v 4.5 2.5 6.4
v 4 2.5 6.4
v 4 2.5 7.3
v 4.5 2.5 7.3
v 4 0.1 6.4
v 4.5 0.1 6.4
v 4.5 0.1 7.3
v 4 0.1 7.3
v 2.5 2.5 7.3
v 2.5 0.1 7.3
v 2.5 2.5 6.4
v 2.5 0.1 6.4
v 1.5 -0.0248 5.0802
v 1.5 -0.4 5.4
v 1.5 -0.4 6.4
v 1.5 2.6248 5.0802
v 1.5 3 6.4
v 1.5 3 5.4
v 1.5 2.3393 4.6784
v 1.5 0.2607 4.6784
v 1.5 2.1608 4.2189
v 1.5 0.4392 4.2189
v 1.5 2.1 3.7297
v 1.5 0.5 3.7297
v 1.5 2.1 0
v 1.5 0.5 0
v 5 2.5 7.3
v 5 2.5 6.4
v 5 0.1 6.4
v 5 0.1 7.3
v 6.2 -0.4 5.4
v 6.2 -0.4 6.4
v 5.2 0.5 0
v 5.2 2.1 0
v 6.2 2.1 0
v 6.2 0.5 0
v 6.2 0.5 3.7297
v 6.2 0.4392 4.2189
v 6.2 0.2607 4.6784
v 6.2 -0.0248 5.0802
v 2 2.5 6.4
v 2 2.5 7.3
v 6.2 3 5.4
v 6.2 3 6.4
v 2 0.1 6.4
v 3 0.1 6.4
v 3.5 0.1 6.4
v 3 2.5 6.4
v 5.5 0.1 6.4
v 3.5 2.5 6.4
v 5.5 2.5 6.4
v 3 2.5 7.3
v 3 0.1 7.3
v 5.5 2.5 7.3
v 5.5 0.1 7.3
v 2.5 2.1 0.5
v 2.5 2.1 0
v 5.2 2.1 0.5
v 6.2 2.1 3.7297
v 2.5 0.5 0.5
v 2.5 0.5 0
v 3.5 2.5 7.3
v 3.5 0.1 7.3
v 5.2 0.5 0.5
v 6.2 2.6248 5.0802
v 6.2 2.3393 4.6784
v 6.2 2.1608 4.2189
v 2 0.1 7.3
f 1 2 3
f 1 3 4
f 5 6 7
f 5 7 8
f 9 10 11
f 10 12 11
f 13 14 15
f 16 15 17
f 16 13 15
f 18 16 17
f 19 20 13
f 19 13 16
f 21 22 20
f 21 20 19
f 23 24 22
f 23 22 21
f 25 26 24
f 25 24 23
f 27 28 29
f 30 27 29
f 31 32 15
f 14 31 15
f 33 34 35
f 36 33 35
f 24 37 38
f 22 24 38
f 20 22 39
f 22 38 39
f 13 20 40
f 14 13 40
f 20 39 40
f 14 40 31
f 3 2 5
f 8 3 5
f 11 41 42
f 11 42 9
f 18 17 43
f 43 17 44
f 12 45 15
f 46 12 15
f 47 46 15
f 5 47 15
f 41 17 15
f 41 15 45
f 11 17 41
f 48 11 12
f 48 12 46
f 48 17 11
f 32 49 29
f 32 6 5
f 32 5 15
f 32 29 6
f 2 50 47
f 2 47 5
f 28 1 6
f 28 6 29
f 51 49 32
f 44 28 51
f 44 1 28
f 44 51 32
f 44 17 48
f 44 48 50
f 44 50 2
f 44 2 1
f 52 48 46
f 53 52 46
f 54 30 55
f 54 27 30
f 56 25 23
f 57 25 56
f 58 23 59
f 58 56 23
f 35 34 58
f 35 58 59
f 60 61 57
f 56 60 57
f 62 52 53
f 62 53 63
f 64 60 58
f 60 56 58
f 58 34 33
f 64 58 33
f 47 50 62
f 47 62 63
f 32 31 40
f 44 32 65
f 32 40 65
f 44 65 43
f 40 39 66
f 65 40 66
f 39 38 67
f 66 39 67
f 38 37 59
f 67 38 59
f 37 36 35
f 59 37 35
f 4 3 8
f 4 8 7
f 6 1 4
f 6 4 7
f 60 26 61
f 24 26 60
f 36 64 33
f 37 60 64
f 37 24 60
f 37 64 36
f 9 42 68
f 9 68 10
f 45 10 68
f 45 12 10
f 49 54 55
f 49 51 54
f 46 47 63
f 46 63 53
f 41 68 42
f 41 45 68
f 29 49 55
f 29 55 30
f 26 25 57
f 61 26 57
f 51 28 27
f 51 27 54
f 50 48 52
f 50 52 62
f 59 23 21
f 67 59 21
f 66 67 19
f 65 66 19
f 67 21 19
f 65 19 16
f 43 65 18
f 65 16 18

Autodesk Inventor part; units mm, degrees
ref_plane "YZ Plane" through (0, 0, 0) normal (1, 0, 0) x (0, 1, 0)
ref_plane "XZ Plane" through (0, 0, 0) normal (0, 1, 0) x (-1, 0, 0)
sketch "Szkic1" plane through (0, 0, 0) normal (0, 0, 1) x (1, 0, 0)
  line L0 (2.7, 2.2) -> (2.7, 0.4) projected
  line L1 (5, 0.4) -> (5, 2.2) projected
  line L2 (5, 2.2) -> (5, 2.6) projected
  line L3 (2.7, 2.6) -> (2.7, 2.2) projected
  line L4 (2.7, 0.4) -> (2.7, 0) projected
  line L5 (5, 0) -> (5, 0.4) projected
  line L6 (2.7, 0) -> (5, 0) projected
  line L7 (5, 2.6) -> (2.7, 2.6) projected
  line L8 (2.5, -0.2) -> (2.5, 0.4)
  line L9 (2.5, 0.4) -> (2.5, 2.2)
  line L10 (2.5, 2.2) -> (2.5, 2.8)
  line L11 (2.5, 2.8) -> (5.2, 2.8)
  line L12 (5.2, 2.8) -> (5.2, 2.2)
  line L13 (5.2, 2.2) -> (5.2, 0.4)
  line L14 (5.2, 0.4) -> (5.2, -0.2)
  line L15 (5.2, -0.2) -> (2.5, -0.2)
  line L16 (2.7, 0) -> (2.7, 2.6) projected
  line L17 (0, 2.6) -> (2.7, 2.6) projected
  line L18 (0, 0) -> (0, 2.6) projected
  line L19 (0, 0) -> (2.7, 0) projected
  line L20 (5, 2.6) -> (5, 0) projected
  line L21 (5, 0) -> (10, 0) projected
  line L22 (10, 0) -> (10, 2.6) projected
  line L23 (5, 2.6) -> (10, 2.6) projected
  line L24 (2.5, 0) -> (1.5, 0)
  line L25 (1.5, 0) -> (1.5, 2.6)
  line L26 (1.5, 2.6) -> (2.5, 2.6)
  line L27 (2.5, 2.6) -> (2.5, 0)
  line L28 (5.2, 0) -> (6.2, 0)
  line L29 (6.2, 0) -> (6.2, 2.6)
  line L30 (6.2, 2.6) -> (5.2, 2.6)
  line L31 (5.2, 2.6) -> (5.2, 0)
  dimension "d0" = 0.2
  dimension "d1" = 1
  dimension "d2" = 1
extrude "Wyciągnięcie proste1" add sketch "Szkic1" along normal blind 0.5 contours L10 L9 L8 L19 L25 L17 | L23 L29 L21 L14 L13 L12
sketch "Szkic2" plane through (0, 0, 0.5) normal (0, 0, 1) x (1, 0, 0)
  line L0 (1.5, 0) -> (2.5, 0) projected
  line L1 (2.5, 0) -> (2.5, 2.6) projected
  line L2 (2.5, 2.6) -> (1.5, 2.6) projected
  line L3 (1.5, 2.6) -> (1.5, 0) projected
  line L4 (6.2, 2.6) -> (5.2, 2.6) projected
  line L5 (5.2, 2.6) -> (5.2, 0) projected
  line L6 (5.2, 0) -> (6.2, 0) projected
  line L7 (6.2, 0) -> (6.2, 2.6) projected
  line L8 (1.5, 2.6) -> (6.2, 2.6)
  line L9 (6.2, 2.6) -> (6.2, 0)
  line L10 (6.2, 0) -> (1.5, 0)
  line L11 (1.5, 0) -> (1.5, 2.6)
  point P0 (0, 0)
ref_plane "Płaszczyzna konstrukcyjna1" through (-1, -0.5, 6.4) normal (0, 0, -1) x (0, 1, 0)
extrude "Wyciągnięcie proste2" add sketch "Szkic2" along normal up to surface (5.9 mm away)
sketch "Szkic3" plane through (1.5, 0, 6.4) normal (0, 0, 1) x (1, 0, 0)
  line L0 (9.5, 3.1) -> (-2.5, 3.1) projected
  line L1 (-2.5, 3.1) -> (-2.5, -0.5) projected
  line L2 (-2.5, -0.5) -> (9.5, -0.5) projected
  line L3 (9.5, -0.5) -> (9.5, 3.1) projected
  line L4 (0, 2.6) -> (0, 0) projected
  line L5 (0, 0) -> (4.7, 0) projected
  line L6 (4.7, 0) -> (4.7, 2.6) projected
  line L7 (4.7, 2.6) -> (0, 2.6) projected
  line L8 (0, 3.1) -> (4.7, 3.1)
  line L9 (4.7, 3.1) -> (4.7, -0.5)
  line L10 (4.7, -0.5) -> (0, -0.5)
  line L11 (0, -0.5) -> (0, 3.1)
  line L12 (-2.4, 3) -> (9.4, 3)
  line L13 (9.4, 3) -> (9.4, -0.4)
  line L14 (9.4, -0.4) -> (-2.4, -0.4)
  line L15 (-2.4, -0.4) -> (-2.4, 3)
  point P0 (-1.5, 0)
  point P1 (4.7, 3)
  point P2 (0, 3)
  point P3 (0, -0.4)
  point P4 (4.7, -0.4)
  dimension "d7" = 0.1
extrude "Wyciągnięcie proste3" add sketch "Szkic3" against normal blind 1 contours L9 L7 L11 L12 | L6 L5 L4 L7 | L14 L11 L5 L9
sketch "Szkic4" plane through (1.5, -0.4, 6.4) normal (0, 0, 1) x (1, 0, 0)
  line L0 (-2.2, 3.2) -> (9.2, 3.2) projected
  line L1 (9.2, 0.2) -> (-2.2, 0.2) projected
  line L2 (-2.2, 0.2) -> (-2.2, 3.2) projected
  line L3 (9.2, 3.2) -> (9.2, 0.2) projected
  line L4 (0, 3.4) -> (0, 0) projected
  line L5 (0, 0) -> (4.7, 0) projected
  line L6 (4.7, 0) -> (4.7, 3.4) projected
  line L7 (4.7, 3.4) -> (0, 3.4) projected
  line L8 (0.5, 0.5) -> (0.5, 2.9)
  line L9 (0.5, 2.9) -> (4.2, 2.9)
  line L10 (4.2, 2.9) -> (4.2, 0.5)
  line L11 (4.2, 0.5) -> (0.5, 0.5)
  line L12 (1, 0.4) -> (1, 3) projected
  line L13 (0.5, 2.9) -> (1, 2.9)
  line L14 (1, 2.9) -> (1, 0.5)
  line L15 (1, 0.5) -> (0.5, 0.5)
  line L16 (0.5, 0.5) -> (0.5, 2.9)
  line L17 (1.5, 2.9) -> (1.5, 0.5)
  line L18 (2, 2.9) -> (2, 0.5)
  line L19 (2.5, 2.9) -> (2.5, 0.5)
  line L20 (3, 2.9) -> (3, 0.5)
  line L21 (3.5, 2.9) -> (3.5, 0.5)
  line L22 (4, 2.9) -> (4, 0.5)
  point P0 (-1.5, 0.4)
  point P1 (4, 0.5)
  point P2 (4, 2.9)
  point P3 (3.5, 2.9)
  point P4 (3.5, 0.5)
  point P5 (3, 0.5)
  point P6 (3, 2.9)
  point P7 (2.5, 0.5)
  point P8 (2, 0.5)
  point P9 (1.5, 2.9)
  point P10 (1.5, 0.5)
  point P11 (1, 2.9)
  dimension "d10" = 0.5
  dimension "d13" = 0.5
extrude "Wyciągnięcie proste4" add sketch "Szkic4" along normal blind 0.9 contours L8 L9 L12 L11 | L17 L9 L18 L11 | L19 L9 L20 L11 | L21 L9 L22 L11
sketch "Szkic5" plane through (1.5, 0, 0) normal (0, -1, 0) x (1, 0, 0)
  line L0 (4.7, 5.4) -> (0, 5.4) projected
  line L1 (0, 0) -> (0, 5.4) projected
  line L2 (0, 0) -> (1, 0) projected
  line L3 (1, 0) -> (1, 0.5) projected
  line L4 (1, 0.5) -> (3.7, 0.5) projected
  line L5 (3.7, 0) -> (3.7, 0.5) projected
  line L6 (3.7, 0) -> (4.7, 0) projected
  line L7 (4.7, 0) -> (4.7, 5.4) projected
  point P0 (-1.5, 0)
extrude "Wyciągnięcie proste5" cut sketch "Szkic5" against normal blind 0.5
sketch "Szkic6" plane through (5.2, 2.6, 0) normal (0, 1, 0) x (1, 0, 0)
  line L0 (-3.7, -5.4) -> (1, -5.4) projected
  line L1 (1, 0) -> (1, -5.4) projected
  line L2 (1, 0) -> (0, 0) projected
  line L3 (0, 0) -> (0, -0.5) projected
  line L4 (0, -0.5) -> (-2.7, -0.5) projected
  line L5 (-2.7, 0) -> (-2.7, -0.5) projected
  line L6 (-2.7, 0) -> (-3.7, 0) projected
  line L7 (-3.7, 0) -> (-3.7, -5.4) projected
  point P0 (-5.2, 0)
extrude "Wyciągnięcie proste6" cut sketch "Szkic6" against normal blind 0.5
fillet "Zaokrąglenie1" radius 2 2 edges at (3.85, 2.1, 5.4) (3.85, 0.5, 5.4)
properties part number "wlacznik_2"
